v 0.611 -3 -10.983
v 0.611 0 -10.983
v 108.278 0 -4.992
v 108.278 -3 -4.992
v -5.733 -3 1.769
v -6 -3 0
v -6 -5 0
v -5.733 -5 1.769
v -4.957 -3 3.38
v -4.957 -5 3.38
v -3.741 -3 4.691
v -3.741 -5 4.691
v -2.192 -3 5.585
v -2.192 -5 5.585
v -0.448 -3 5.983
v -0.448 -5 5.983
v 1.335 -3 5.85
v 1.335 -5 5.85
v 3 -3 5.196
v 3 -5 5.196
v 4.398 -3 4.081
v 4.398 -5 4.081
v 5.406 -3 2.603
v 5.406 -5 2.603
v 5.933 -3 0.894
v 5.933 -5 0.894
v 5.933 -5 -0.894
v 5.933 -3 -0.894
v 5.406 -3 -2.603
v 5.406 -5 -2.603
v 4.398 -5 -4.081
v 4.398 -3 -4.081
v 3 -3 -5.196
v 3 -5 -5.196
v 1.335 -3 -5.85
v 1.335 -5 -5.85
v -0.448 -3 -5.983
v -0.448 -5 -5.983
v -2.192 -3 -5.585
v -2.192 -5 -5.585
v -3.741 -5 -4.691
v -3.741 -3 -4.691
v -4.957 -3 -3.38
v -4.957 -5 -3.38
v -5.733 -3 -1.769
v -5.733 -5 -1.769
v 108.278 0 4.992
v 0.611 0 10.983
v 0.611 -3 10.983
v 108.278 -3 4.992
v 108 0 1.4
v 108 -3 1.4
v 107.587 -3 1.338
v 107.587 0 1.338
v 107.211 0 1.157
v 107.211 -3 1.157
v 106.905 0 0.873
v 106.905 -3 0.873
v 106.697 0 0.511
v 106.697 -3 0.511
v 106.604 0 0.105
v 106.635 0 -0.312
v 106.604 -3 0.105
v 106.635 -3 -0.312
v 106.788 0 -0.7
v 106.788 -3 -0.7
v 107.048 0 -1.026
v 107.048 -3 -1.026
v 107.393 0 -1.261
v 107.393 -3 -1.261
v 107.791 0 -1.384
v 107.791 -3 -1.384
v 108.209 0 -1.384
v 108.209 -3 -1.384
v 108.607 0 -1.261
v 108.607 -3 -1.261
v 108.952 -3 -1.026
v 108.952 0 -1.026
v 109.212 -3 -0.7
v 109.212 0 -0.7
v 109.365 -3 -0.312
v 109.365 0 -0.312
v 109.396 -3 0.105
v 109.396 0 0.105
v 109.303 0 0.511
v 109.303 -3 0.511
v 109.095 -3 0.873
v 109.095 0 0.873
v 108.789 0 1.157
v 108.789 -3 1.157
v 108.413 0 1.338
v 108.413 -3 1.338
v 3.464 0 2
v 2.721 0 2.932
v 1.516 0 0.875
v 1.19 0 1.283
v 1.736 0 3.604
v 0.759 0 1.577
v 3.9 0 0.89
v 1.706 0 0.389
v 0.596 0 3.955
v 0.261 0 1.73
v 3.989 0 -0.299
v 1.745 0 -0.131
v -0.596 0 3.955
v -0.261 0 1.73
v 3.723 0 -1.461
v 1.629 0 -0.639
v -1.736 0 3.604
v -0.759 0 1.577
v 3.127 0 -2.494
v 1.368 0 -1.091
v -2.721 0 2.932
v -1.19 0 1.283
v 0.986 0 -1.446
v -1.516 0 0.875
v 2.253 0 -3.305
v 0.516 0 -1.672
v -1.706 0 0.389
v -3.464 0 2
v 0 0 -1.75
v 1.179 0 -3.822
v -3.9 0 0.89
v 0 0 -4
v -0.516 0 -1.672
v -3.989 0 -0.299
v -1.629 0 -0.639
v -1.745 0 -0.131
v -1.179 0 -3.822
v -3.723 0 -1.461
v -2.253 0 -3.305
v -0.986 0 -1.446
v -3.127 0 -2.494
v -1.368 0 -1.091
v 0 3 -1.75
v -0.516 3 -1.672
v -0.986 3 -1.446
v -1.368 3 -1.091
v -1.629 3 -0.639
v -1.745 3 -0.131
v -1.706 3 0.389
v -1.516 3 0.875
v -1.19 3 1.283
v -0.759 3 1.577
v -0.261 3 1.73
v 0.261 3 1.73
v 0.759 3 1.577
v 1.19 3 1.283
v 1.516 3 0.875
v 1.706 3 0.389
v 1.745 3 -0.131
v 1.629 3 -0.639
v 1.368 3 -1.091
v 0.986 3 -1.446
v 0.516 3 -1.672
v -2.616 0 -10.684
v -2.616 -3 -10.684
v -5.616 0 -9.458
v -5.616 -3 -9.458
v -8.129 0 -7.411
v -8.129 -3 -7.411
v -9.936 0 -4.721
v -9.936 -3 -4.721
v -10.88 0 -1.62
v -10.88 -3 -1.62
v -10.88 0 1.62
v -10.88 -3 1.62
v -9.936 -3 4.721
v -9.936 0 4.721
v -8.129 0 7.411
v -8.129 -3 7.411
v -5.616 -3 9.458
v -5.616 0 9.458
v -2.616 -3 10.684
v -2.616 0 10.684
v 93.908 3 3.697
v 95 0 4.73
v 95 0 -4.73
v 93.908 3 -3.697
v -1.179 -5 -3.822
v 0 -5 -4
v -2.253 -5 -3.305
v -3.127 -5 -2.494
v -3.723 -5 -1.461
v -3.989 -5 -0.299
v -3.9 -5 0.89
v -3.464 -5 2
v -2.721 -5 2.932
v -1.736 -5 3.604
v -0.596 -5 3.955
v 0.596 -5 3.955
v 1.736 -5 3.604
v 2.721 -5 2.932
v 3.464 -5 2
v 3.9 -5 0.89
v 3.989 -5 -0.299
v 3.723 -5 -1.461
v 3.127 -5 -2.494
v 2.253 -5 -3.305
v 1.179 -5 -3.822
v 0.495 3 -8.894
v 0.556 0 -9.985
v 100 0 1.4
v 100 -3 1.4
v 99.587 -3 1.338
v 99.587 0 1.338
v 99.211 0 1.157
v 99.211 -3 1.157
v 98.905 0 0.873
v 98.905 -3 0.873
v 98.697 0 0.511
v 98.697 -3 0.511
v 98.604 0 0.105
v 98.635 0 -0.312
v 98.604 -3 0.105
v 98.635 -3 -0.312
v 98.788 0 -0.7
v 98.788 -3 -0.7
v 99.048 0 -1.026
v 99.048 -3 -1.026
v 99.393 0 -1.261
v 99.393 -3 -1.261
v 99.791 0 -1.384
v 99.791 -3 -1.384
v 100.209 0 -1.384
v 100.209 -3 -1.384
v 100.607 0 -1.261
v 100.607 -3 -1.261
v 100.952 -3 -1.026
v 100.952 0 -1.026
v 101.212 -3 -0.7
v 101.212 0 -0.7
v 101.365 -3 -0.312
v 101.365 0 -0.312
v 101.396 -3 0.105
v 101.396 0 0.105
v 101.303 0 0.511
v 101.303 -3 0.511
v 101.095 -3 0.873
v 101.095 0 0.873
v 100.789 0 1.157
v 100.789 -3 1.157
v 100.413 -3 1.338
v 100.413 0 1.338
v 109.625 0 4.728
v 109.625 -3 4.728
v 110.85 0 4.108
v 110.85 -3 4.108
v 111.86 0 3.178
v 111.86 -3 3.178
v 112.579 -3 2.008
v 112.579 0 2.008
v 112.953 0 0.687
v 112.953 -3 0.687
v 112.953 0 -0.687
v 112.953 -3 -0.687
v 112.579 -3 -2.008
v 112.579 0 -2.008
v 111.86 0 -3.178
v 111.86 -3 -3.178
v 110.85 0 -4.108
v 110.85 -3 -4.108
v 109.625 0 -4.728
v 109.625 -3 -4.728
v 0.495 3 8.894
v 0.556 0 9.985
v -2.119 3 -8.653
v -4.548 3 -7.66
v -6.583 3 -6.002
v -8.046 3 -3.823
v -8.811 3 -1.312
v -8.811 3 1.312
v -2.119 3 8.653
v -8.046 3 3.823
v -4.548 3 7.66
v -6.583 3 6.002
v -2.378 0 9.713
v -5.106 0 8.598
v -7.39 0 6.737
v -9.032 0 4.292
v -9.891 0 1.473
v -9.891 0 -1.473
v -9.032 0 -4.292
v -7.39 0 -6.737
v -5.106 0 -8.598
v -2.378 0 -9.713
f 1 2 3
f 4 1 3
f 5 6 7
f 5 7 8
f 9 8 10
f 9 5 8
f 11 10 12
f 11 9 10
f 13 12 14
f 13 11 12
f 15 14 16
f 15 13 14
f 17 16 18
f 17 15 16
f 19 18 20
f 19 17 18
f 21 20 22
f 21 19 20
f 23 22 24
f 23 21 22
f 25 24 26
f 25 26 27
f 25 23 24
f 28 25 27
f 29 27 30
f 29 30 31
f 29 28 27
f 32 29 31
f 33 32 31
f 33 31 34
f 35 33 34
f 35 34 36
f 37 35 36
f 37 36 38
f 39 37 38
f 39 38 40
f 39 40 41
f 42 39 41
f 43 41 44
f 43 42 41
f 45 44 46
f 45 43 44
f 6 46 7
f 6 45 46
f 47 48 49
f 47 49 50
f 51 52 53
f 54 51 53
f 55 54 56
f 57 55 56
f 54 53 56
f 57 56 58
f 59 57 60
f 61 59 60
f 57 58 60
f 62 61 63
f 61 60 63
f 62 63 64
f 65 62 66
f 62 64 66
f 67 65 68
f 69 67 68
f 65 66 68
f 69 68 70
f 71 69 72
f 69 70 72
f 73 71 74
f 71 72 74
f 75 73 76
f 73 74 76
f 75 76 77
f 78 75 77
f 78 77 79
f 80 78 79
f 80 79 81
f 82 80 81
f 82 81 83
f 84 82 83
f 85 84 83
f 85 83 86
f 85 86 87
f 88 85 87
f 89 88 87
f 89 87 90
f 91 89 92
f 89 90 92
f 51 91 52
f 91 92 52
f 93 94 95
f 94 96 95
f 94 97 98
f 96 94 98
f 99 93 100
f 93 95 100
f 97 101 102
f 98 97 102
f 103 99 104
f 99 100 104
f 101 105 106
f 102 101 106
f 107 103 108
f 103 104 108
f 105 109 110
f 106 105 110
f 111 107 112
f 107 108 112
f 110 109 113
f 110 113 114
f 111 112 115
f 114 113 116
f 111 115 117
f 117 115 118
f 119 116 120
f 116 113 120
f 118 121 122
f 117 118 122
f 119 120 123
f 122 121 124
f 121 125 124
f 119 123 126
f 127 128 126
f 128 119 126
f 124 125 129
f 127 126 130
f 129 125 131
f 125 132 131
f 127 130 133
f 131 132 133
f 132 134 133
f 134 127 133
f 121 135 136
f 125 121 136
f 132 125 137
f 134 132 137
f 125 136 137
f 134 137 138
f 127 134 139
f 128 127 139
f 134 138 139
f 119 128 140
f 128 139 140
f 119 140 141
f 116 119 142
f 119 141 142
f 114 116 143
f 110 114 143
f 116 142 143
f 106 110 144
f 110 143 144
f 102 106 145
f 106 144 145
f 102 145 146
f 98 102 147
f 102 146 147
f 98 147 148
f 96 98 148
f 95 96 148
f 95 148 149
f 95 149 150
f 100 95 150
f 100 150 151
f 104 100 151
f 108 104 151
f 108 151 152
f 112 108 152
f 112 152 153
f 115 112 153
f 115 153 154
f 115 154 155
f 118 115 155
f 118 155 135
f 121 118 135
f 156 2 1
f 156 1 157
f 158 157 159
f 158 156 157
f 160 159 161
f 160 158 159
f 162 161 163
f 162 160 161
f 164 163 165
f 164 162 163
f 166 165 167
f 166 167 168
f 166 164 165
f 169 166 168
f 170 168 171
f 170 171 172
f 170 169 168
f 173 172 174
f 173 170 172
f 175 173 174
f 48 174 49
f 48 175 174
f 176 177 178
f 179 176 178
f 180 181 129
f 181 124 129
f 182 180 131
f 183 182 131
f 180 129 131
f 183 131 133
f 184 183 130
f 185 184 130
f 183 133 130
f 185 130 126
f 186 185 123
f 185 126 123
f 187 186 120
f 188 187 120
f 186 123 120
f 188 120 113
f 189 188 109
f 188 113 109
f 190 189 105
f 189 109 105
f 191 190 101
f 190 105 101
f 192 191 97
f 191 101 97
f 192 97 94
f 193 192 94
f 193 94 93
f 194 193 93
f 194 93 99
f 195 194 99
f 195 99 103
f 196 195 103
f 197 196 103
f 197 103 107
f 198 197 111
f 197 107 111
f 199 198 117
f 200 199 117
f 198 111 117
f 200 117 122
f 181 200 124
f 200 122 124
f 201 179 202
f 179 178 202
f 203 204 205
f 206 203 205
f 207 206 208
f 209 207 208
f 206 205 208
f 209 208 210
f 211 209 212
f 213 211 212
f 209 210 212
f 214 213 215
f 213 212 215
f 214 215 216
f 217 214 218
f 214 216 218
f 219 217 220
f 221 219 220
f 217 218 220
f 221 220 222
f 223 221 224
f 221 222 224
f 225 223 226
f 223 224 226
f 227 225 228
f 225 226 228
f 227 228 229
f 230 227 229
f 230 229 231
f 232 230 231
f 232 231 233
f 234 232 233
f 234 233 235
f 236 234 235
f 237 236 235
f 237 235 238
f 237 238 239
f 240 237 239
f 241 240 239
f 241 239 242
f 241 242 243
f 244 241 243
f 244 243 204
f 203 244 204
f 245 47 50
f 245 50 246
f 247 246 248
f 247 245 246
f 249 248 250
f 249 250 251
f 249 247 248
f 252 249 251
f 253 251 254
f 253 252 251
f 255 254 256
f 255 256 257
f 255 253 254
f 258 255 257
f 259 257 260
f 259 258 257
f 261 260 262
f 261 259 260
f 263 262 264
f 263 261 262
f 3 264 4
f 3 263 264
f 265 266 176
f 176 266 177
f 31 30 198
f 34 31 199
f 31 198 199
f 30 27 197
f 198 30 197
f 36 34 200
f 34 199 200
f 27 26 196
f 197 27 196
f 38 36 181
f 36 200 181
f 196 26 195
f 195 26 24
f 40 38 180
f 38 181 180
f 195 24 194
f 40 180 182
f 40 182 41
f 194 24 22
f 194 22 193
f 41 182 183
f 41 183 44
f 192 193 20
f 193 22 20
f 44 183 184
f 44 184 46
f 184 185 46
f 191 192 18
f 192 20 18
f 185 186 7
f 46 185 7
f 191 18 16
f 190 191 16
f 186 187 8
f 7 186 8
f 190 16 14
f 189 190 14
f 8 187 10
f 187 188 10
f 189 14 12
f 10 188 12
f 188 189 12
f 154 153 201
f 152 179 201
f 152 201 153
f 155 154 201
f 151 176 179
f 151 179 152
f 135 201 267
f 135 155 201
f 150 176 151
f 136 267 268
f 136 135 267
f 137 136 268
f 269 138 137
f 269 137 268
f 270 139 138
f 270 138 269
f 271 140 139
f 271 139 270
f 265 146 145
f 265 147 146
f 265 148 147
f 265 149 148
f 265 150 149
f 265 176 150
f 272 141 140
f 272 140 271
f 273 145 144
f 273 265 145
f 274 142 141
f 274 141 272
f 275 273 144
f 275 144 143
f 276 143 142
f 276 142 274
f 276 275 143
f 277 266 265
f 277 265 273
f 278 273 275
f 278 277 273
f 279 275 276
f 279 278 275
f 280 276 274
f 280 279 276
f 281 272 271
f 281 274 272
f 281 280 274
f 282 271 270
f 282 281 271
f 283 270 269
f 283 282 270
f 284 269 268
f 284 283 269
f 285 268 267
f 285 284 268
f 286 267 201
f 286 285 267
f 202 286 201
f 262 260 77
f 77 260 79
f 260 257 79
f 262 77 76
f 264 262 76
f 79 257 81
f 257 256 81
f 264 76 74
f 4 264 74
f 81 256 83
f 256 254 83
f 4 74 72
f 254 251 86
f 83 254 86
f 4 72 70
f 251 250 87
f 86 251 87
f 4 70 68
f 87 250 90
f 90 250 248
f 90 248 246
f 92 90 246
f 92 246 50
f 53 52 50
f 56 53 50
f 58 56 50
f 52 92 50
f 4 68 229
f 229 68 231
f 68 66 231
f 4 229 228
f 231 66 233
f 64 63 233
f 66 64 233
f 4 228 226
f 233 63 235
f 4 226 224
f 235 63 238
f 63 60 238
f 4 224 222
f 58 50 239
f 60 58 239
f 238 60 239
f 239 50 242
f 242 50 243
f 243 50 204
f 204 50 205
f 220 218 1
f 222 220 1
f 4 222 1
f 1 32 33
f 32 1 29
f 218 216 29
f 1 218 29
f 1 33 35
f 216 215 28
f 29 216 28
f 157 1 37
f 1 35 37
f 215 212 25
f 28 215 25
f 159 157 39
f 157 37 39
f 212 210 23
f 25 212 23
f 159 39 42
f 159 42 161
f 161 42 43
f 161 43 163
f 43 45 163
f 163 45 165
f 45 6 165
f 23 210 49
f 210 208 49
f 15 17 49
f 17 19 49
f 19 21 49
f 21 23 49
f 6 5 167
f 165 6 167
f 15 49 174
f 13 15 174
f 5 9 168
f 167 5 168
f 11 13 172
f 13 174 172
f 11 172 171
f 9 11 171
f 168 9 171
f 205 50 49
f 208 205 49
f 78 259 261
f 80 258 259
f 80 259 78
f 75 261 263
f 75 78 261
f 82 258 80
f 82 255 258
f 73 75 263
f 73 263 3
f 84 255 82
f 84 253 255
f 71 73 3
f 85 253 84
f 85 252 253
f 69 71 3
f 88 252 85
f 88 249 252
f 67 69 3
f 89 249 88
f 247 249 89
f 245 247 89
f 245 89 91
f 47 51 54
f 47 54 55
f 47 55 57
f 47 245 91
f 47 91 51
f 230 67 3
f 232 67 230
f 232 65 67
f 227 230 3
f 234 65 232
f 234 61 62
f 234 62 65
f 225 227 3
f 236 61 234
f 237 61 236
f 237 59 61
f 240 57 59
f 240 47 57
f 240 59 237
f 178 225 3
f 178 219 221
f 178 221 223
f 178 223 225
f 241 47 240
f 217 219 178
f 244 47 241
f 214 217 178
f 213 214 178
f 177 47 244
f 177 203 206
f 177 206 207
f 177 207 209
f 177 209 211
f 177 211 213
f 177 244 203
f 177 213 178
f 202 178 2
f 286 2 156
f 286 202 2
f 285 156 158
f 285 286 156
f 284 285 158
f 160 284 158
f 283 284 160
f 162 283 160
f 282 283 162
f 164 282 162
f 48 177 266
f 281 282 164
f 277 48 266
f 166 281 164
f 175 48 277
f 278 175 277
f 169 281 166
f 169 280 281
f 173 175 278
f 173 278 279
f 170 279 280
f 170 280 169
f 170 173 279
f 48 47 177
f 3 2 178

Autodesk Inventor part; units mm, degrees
ref_plane "YZ Plane" through (0, 0, 0) normal (1, 0, 0) x (0, 1, 0)
ref_plane "XZ Plane" through (0, 0, 0) normal (0, 1, 0) x (-1, 0, 0)
ref_plane "XY Plane" through (0, 0, 0) normal (0, 0, 1) x (1, 0, 0)
sketch "Sketch1" plane through (0, 0, 0) normal (0, 1, 0) x (-1, 0, 0)
  arc A0 (-0.611111, -10.983012) -> (-0.611111, 10.983012) centre (0, 0) ccw
  line L0 (0, 0) -> (-108, 0) construction
  arc A1 (-108.277778, 4.992278) -> (-108.277778, -4.992278) centre (-108, 0) ccw
  line L1 (-0.611111, 10.983012) -> (-108.277778, 4.992278)
  line L2 (-0.611111, -10.983012) -> (-108.277778, -4.992278)
  circle A2 centre (0, 0) radius 6
  line L3 (-108.222222, 3.993822) -> (-0.555556, 9.984556)
  arc A3 (-0.555556, -9.984556) -> (-0.555556, 9.984556) centre (0, 0) ccw
  line L4 (-0.555556, -9.984556) -> (-108.222222, -3.993822)
  arc A4 (-108.222222, 3.993822) -> (-108.222222, -3.993822) centre (-108, 0) ccw
  line L5 (-95, -4.729527) -> (-95, 4.729527)
  point P0 (-100, 0)
  dimension "d0" = 22
  dimension "d1" = 108
  dimension "d2" = 10
  dimension "d3" = 8
  dimension "d6" = 12
  dimension "d7" = 1
  dimension "d8" = 13
extrude "Extrusion1" add sketch "Sketch1" against normal blind 3 contours L2 A1 L1 A0 | A2 | L3 L5 L4 A4 | L3 A3 L4 L5
sketch "Sketch1 outline for Extrusion2" plane through (0, 0, 0) normal (0, 1, 0) x (-1, 0, 0)
  arc A0 (-0.555556, -9.984556) -> (-0.555556, 9.984556) centre (0, 0) ccw
  line L0 (-95, -4.729527) -> (-0.555556, -9.984556)
  line L1 (-95, 4.729527) -> (-95, -4.729527)
  line L2 (-0.555556, 9.984556) -> (-95, 4.729527)
extrude "Extrusion2" add sketch "Sketch1 outline for Extrusion2" along normal blind 3 draft -20
extrude "Extrusion3" add sketch "Sketch1" against normal blind 5 contours A2
hole "Hole1" at (108, 0, 0) at (100, 0, 0) direction (0, -1, 0) diameter 2.8 end through all
hole "Hole2" at (0, -5, 0) direction (0, 1, 0) diameter 3.5 end through all
hole "Hole3" at (0, -5, 0) direction (0, 1, 0) diameter 8 depth 5
properties part number "servo arm TGY-S8166M long"
